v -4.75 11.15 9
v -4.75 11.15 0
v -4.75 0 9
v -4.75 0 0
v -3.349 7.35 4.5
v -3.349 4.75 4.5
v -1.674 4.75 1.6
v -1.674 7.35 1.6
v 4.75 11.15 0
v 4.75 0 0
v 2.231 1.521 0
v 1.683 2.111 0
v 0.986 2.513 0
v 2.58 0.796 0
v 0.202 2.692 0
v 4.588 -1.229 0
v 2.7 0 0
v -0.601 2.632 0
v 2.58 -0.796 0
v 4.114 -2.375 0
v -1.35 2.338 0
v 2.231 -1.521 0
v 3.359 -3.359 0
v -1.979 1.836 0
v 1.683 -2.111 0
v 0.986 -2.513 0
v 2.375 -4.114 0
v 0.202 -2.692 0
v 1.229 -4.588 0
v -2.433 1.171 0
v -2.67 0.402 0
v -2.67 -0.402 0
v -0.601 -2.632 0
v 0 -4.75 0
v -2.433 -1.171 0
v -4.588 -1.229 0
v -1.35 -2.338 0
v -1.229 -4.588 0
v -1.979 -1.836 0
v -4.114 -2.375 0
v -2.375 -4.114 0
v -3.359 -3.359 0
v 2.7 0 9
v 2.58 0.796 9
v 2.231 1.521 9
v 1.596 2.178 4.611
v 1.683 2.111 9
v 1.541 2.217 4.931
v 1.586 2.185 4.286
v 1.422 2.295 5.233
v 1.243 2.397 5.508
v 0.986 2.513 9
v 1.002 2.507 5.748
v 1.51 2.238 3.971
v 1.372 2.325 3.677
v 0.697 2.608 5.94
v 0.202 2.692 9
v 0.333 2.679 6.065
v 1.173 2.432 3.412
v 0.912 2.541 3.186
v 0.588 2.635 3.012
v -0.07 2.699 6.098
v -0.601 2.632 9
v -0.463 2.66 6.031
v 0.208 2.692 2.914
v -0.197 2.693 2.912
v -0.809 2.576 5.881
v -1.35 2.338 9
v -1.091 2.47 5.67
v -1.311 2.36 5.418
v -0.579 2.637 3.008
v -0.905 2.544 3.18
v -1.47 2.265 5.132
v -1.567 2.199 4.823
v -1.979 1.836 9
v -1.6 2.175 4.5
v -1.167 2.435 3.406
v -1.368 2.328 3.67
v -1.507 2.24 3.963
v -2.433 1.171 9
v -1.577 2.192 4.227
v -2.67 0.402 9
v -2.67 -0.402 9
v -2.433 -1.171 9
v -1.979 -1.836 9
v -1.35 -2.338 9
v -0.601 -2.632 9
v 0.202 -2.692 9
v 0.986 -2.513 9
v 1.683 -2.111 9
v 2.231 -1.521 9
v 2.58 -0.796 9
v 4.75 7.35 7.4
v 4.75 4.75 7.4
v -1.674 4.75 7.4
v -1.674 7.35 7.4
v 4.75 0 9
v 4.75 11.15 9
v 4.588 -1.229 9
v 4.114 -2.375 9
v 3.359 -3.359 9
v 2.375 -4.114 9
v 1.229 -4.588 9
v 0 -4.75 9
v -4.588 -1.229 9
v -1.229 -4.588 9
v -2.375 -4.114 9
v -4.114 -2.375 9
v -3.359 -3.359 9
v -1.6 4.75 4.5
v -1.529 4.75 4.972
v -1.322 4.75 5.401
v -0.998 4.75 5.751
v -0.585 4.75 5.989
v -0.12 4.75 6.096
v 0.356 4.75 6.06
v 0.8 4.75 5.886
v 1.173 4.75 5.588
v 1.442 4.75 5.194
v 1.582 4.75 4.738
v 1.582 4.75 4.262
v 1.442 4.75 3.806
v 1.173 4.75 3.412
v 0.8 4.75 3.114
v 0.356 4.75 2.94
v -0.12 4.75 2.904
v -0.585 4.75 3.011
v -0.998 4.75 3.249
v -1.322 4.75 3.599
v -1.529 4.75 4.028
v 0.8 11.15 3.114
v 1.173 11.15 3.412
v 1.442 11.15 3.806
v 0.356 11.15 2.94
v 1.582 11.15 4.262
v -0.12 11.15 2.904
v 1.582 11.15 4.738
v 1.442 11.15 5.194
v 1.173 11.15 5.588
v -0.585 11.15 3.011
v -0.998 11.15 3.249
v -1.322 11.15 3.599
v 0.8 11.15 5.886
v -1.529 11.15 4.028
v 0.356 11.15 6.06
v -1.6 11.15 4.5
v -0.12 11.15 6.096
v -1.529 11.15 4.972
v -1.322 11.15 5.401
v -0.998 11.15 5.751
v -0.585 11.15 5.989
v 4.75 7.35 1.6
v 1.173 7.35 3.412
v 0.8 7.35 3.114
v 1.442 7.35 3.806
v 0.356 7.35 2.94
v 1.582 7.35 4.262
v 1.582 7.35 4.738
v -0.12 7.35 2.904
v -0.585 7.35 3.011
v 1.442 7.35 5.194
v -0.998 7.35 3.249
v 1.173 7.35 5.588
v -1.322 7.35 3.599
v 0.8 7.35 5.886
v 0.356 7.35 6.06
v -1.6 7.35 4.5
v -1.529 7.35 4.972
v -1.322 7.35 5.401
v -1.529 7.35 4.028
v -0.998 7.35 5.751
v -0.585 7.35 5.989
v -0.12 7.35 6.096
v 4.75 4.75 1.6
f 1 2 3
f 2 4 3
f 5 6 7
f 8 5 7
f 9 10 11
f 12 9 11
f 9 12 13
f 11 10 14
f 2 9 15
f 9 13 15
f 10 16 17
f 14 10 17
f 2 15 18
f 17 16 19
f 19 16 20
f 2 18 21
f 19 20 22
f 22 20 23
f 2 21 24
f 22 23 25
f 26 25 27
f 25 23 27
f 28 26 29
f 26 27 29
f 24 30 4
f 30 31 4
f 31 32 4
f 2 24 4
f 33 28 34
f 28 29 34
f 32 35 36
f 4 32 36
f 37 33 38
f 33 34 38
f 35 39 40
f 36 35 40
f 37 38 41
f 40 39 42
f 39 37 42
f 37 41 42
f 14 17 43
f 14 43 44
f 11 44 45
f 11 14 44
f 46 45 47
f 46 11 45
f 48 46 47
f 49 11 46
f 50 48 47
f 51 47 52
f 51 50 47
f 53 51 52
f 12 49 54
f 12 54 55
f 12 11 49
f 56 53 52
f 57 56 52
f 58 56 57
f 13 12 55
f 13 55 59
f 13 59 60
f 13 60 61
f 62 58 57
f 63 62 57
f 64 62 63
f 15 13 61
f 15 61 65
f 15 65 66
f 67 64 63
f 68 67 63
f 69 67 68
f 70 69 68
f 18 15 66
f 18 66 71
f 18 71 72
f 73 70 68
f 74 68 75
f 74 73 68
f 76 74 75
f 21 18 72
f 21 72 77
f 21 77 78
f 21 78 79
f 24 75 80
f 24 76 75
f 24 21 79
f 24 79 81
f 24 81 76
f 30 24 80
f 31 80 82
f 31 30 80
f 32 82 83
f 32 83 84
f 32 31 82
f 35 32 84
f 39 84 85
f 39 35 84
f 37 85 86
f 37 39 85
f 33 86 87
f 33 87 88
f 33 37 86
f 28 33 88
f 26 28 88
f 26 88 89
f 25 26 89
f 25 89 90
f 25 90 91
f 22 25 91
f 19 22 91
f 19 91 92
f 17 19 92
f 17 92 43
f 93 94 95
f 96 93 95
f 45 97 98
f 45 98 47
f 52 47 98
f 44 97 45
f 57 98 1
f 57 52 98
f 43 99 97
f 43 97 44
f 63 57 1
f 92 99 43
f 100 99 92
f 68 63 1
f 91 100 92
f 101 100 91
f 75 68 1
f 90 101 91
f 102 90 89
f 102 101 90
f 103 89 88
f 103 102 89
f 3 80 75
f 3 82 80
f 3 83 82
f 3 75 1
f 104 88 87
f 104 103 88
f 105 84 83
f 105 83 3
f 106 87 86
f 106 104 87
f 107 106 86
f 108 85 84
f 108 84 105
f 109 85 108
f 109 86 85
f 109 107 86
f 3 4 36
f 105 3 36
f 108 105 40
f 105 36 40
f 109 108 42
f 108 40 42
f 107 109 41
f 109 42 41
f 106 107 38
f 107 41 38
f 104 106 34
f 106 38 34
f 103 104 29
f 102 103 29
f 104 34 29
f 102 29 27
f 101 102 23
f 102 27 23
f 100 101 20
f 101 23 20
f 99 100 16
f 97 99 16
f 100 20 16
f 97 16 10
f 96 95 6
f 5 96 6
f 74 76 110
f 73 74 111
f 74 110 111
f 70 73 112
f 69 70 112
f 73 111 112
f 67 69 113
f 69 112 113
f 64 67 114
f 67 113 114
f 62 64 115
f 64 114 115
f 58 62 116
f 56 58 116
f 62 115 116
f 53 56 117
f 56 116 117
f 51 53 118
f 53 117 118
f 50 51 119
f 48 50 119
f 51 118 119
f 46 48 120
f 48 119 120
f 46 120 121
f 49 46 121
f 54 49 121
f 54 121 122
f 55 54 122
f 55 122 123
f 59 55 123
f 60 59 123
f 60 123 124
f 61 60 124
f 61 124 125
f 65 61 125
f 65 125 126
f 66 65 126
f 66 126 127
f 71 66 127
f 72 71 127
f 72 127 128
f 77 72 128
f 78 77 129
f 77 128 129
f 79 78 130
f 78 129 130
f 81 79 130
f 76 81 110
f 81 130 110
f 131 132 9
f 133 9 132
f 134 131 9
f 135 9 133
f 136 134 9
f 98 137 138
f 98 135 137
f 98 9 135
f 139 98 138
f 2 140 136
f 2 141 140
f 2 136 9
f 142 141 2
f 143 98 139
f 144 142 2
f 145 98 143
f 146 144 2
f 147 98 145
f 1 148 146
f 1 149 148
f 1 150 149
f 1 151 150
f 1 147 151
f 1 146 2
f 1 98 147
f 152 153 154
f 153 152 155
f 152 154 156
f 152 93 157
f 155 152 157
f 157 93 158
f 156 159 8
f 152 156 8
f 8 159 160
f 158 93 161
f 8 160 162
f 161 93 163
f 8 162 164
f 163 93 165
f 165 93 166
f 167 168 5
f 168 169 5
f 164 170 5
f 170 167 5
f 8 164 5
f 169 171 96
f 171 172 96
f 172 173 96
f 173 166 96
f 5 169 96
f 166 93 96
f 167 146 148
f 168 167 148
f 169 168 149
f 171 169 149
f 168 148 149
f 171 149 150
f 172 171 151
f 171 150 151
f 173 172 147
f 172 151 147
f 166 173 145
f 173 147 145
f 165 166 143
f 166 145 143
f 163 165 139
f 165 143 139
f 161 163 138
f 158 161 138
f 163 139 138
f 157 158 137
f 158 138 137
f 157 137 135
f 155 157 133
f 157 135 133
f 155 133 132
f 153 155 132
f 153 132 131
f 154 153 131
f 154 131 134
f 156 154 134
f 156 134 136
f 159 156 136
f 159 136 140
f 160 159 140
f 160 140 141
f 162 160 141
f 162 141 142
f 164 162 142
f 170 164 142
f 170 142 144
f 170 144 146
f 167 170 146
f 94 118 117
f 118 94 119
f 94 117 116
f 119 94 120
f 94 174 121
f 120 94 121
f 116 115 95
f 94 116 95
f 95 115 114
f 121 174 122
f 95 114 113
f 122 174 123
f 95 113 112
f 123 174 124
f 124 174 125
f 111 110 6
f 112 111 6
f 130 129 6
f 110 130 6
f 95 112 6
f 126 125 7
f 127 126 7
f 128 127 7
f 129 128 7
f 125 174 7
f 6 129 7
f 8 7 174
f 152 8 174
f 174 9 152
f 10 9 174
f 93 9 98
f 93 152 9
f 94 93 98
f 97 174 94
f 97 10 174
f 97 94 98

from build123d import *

# Parameters (mm, degrees)
F0_R     = 2.7
F1_DEPTH = 9
F3_DEPTH = 2.6
F4_W     = 9.5
F4_H     = 9
F5_DEPTH = 3.8
F6_R     = 1.6
F7_DEPTH = 9


with BuildPart() as f1:
    # F0 (on Top) → F1 (new body)
    with BuildSketch(Plane.XY):
        with BuildLine():
            ThreePointArc((0, 4.75), (3.358757, 3.358757), (4.75, 0))
            Line((4.75, 0), (4.75, 4.75))
            Line((4.75, 4.75), (0, 4.75))
        make_face()
        with BuildLine():
            ThreePointArc((-4.75, 0), (-3.358757, 3.358757), (0, 4.75))
            Line((0, 4.75), (-4.75, 4.75))
            Line((-4.75, 4.75), (-4.75, 0))
        make_face()
        with BuildLine():
            ThreePointArc((-4.75, 0), (0, -4.75), (4.75, 0))
            ThreePointArc((4.75, 0), (3.358757, 3.358757), (0, 4.75))
            ThreePointArc((0, 4.75), (-3.358757, 3.358757), (-4.75, 0))
        make_face()
        Circle(F0_R, mode=Mode.SUBTRACT)
    extrude(amount=F1_DEPTH)

    # F2 (on face) → F3 (join)
    with BuildSketch(Plane(origin=(0, 4.75, 0), x_dir=(-1, 0, 0), z_dir=(0, 1, 0))):
        Polygon((-4.75, 7.4), (-1.674316, 7.4), (1.674316, 7.4), (3.348632, 4.5), (1.674316, 1.6), (-1.674316, 1.6), (-4.75, 1.6), (-4.75, 0), (4.75, 0), (4.75, 9), (-4.75, 9), align=None)
    extrude(amount=F3_DEPTH)

    # F4 (on face) → F5 (join)
    with BuildSketch(Plane(origin=(0, 7.35, 0), x_dir=(-1, 0, 0), z_dir=(0, 1, 0))):
        with Locations((0, 4.5)):
            Rectangle(F4_W, F4_H)
    extrude(amount=F5_DEPTH)

    # F6 (on face) → F7 (cut)
    with BuildSketch(Plane(origin=(0, 11.15, 0), x_dir=(-1, 0, 0), z_dir=(0, 1, 0))):
        with Locations((0, 4.5)):
            Circle(F6_R)
    extrude(amount=-F7_DEPTH, mode=Mode.SUBTRACT)


solid = f1.part
